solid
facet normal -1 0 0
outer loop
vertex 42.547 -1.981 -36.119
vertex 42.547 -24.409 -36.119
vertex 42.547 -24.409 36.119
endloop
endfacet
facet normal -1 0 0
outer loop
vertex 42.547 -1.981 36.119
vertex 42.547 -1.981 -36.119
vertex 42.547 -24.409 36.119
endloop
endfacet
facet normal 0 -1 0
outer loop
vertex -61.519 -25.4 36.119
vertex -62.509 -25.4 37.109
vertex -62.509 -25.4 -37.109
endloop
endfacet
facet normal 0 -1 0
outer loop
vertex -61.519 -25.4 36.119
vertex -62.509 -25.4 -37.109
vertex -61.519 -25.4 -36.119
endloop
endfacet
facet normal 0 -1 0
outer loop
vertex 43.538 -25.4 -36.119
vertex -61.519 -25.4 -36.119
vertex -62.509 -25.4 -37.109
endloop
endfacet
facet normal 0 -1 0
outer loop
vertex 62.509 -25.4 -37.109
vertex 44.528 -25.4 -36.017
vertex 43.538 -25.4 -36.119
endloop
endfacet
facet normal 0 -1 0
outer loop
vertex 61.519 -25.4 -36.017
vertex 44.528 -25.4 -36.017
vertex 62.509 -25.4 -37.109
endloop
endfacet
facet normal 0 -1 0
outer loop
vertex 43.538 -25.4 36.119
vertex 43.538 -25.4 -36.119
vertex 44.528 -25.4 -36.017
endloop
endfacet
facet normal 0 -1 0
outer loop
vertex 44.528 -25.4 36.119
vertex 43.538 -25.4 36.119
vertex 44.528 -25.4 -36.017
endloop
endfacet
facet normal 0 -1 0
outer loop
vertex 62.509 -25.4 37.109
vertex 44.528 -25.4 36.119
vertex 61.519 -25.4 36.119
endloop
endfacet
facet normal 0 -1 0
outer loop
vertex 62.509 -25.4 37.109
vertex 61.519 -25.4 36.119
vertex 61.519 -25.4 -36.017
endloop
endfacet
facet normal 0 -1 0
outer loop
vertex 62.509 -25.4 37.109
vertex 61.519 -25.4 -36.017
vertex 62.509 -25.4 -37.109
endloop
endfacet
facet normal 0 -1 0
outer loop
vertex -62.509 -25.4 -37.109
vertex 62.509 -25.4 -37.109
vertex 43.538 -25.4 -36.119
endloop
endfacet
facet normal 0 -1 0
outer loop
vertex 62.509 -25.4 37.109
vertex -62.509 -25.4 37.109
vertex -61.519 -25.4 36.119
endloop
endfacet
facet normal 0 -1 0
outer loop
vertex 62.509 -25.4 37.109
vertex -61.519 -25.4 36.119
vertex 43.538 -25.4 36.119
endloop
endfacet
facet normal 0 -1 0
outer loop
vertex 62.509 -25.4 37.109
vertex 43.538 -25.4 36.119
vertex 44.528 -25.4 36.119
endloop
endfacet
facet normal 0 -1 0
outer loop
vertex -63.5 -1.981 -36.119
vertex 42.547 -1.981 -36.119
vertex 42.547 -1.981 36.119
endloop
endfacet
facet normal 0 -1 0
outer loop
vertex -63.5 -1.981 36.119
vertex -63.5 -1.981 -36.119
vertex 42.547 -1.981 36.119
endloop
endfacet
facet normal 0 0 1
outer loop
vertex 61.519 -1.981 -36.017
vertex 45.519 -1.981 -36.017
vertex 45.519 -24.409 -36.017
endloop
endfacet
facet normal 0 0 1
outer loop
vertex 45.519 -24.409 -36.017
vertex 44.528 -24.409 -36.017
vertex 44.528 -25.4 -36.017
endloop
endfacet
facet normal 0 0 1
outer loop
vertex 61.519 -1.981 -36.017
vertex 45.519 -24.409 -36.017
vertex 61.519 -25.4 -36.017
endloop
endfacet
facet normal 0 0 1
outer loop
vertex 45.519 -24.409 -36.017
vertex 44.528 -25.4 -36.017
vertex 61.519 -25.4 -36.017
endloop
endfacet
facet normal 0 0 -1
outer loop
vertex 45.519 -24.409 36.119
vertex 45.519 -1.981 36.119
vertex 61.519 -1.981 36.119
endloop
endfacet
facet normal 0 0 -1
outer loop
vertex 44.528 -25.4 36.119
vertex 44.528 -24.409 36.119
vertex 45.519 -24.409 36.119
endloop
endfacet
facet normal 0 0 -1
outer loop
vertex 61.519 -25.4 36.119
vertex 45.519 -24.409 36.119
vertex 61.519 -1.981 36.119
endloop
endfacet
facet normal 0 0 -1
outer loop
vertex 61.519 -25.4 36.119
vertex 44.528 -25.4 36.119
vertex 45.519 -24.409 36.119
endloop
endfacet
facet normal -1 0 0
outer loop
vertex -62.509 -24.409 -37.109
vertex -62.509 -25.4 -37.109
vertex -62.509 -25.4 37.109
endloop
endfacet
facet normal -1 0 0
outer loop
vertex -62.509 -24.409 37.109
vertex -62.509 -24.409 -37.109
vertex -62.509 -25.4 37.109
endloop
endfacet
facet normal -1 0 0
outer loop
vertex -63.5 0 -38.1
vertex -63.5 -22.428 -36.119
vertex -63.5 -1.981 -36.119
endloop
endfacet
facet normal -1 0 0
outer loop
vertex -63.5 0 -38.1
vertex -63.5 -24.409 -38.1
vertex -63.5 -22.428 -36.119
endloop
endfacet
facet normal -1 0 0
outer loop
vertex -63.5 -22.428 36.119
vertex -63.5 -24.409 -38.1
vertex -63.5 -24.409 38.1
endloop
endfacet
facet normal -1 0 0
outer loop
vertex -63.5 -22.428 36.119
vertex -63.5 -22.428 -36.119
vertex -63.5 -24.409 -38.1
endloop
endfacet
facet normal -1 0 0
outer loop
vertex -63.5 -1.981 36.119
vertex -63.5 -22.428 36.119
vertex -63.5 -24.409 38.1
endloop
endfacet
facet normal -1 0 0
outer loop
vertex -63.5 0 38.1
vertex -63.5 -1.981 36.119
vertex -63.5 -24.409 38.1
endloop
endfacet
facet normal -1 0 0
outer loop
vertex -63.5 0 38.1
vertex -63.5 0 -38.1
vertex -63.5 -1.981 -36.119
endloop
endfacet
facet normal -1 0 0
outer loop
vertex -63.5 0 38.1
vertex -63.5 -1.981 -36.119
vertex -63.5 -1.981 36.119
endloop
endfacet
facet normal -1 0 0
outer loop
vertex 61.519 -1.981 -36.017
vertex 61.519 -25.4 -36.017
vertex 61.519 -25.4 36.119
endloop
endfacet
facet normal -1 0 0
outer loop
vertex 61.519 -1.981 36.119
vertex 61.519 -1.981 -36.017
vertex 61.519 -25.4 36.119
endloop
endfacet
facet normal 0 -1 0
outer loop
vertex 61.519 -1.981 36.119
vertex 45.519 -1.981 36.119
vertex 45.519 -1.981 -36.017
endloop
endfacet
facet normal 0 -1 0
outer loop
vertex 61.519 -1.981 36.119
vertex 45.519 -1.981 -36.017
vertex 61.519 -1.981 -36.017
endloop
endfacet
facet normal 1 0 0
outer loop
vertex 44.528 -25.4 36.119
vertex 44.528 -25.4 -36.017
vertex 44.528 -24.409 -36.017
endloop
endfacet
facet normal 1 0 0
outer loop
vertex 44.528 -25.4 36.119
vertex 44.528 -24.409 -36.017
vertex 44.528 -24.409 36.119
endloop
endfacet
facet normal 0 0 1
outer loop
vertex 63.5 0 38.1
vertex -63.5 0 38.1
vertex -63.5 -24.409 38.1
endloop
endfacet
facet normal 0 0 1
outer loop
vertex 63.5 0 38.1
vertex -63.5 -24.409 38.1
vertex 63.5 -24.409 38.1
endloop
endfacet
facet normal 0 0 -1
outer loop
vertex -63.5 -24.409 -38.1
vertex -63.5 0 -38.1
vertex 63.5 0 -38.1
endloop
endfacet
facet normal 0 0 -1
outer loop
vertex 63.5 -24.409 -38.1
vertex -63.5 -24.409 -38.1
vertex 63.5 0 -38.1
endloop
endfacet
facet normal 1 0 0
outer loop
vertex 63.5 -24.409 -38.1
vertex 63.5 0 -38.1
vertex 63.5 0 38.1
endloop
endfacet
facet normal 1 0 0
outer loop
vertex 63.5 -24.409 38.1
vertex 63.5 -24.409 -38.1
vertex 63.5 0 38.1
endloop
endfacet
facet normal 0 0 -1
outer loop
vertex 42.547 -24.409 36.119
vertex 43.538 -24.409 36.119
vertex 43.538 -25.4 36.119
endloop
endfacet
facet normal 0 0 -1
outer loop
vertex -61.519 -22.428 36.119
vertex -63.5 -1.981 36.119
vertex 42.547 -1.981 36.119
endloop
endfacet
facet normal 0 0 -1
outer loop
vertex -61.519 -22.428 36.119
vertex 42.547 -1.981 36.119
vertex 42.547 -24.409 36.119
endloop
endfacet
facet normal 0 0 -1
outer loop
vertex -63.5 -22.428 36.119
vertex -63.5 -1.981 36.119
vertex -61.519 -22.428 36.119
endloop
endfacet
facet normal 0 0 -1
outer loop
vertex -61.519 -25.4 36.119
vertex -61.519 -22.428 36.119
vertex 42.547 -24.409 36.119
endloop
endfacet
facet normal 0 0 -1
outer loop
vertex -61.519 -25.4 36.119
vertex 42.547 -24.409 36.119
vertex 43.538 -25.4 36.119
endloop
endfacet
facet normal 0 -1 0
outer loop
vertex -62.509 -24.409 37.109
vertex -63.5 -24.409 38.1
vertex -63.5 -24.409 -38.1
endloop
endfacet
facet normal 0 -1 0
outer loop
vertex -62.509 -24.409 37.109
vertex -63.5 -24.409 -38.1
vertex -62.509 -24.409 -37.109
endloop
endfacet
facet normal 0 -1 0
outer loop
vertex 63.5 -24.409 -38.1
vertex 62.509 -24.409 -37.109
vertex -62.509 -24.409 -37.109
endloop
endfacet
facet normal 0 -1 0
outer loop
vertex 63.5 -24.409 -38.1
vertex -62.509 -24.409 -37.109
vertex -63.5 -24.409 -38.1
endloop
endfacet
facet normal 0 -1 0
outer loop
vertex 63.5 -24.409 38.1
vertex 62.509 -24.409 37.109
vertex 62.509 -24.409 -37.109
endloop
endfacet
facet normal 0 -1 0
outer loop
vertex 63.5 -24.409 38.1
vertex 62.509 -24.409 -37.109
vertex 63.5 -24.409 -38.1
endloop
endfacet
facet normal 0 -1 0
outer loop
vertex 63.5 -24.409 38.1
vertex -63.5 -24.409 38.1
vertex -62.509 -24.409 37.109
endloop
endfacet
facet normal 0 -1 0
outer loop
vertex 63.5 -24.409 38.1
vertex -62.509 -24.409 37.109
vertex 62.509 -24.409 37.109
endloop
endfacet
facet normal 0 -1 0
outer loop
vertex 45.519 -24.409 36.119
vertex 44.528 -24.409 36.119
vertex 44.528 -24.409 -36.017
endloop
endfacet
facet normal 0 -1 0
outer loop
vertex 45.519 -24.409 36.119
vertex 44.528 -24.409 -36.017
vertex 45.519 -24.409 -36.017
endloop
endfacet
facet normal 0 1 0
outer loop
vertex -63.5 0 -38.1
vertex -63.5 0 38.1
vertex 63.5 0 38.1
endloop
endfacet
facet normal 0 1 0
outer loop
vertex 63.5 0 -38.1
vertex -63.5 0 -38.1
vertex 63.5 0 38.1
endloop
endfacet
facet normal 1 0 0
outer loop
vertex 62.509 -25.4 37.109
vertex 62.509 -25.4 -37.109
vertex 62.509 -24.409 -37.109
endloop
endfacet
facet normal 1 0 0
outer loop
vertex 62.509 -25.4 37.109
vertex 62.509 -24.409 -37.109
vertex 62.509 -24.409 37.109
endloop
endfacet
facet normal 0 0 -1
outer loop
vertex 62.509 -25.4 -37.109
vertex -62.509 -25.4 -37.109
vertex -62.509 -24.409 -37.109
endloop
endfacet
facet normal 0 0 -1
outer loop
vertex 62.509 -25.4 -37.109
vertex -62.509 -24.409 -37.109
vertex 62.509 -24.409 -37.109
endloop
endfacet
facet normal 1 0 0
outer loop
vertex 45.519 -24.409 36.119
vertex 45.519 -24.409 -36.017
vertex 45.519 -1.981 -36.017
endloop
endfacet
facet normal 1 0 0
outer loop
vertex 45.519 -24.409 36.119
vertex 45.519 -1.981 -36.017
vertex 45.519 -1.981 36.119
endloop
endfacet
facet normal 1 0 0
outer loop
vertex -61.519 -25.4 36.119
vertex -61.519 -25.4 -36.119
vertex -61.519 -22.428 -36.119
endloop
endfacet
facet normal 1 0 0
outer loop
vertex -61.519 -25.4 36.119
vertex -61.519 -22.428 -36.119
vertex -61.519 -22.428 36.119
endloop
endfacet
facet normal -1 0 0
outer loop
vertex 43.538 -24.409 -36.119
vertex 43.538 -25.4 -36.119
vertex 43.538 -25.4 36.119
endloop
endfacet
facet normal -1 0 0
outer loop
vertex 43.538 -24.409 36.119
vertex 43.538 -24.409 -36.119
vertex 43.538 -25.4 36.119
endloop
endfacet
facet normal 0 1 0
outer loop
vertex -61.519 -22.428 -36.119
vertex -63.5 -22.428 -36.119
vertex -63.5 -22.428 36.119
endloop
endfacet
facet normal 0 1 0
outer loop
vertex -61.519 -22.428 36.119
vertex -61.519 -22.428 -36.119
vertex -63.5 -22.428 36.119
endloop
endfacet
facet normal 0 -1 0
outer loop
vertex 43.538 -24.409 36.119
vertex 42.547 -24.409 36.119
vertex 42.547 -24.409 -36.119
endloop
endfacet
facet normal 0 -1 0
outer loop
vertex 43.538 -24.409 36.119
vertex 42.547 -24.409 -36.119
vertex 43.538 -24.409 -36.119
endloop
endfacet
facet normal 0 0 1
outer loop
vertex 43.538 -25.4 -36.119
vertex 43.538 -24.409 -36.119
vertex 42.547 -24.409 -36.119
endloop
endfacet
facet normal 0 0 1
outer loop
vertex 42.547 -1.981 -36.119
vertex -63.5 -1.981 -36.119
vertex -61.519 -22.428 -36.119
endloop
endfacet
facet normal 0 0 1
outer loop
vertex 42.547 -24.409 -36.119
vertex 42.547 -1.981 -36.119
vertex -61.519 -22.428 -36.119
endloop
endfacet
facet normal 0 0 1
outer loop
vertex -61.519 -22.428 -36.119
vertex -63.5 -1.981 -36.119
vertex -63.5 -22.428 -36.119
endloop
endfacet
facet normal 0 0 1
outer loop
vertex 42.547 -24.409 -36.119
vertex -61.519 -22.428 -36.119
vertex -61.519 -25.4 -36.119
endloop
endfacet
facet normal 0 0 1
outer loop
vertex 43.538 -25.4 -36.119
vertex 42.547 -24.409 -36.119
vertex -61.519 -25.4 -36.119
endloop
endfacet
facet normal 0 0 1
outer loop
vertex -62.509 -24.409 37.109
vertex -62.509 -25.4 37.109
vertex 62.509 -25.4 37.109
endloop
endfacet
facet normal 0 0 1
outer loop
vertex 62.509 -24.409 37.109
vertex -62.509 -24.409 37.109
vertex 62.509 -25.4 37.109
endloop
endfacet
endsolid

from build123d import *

# Parameters (mm, degrees)
F0_W      = 127
F0_H      = 76.2
F1_DEPTH  = 25.4
F2_W      = 15.9999934
F2_H      = 72.136
F3_DEPTH  = 23.4188
F4_W      = 0.9906
F4_H      = 72.136
F5_DEPTH  = 0.9906
F6_W      = 127
F6_H      = 0.9906
F7_DEPTH  = 0.9906
F8_W      = 0.9906
F8_H      = 75.2094
F9_DEPTH  = 0.9906
F10_W     = 0.9906
F10_H     = 75.2094
F11_DEPTH = 0.9906
F12_W     = 125.0188
F12_H     = 0.9906
F13_DEPTH = 0.9906
F14_W     = 104.0658066
F14_H     = 72.2376
F15_DEPTH = 23.4188
F16_W     = 0.9906
F16_H     = 72.2376
F17_DEPTH = 0.9906
F18_W     = 20.447
F18_H     = 72.2376
F19_DEPTH = 1.9812


with BuildPart() as f1:
    # F0 (on Front) → F1 (new body)
    with BuildSketch(Plane.XZ):
        Rectangle(F0_W, F0_H)
    extrude(amount=F1_DEPTH)

    # F2 (on face) → F3 (cut)
    with BuildSketch(Plane.XZ.offset(25.4)):
        with Locations((53.5188033, 0.0508)):
            Rectangle(F2_W, F2_H)
    extrude(amount=-F3_DEPTH, mode=Mode.SUBTRACT)

    # F4 (on face) → F5 (cut)
    with BuildSketch(Plane.XZ.offset(25.4)):
        with Locations((45.0235066, 0.0508)):
            Rectangle(F4_W, F4_H)
    extrude(amount=-F5_DEPTH, mode=Mode.SUBTRACT)

    # F6 (on face) → F7 (cut)
    with BuildSketch(Plane.XZ.offset(25.4)):
        with Locations((0, 37.6047)):
            Rectangle(F6_W, F6_H)
    extrude(amount=-F7_DEPTH, mode=Mode.SUBTRACT)

    # F8 (on face) → F9 (cut)
    with BuildSketch(Plane.XZ.offset(25.4)):
        with Locations((63.0047, -0.4953)):
            Rectangle(F8_W, F8_H)
    extrude(amount=-F9_DEPTH, mode=Mode.SUBTRACT)

    # F10 (on face) → F11 (cut)
    with BuildSketch(Plane.XZ.offset(25.4)):
        with Locations((-63.0047, -0.4953)):
            Rectangle(F10_W, F10_H)
    extrude(amount=-F11_DEPTH, mode=Mode.SUBTRACT)

    # F12 (on face) → F13 (cut)
    with BuildSketch(Plane.XZ.offset(25.4)):
        with Locations((0, -37.6047)):
            Rectangle(F12_W, F12_H)
    extrude(amount=-F13_DEPTH, mode=Mode.SUBTRACT)

    # F14 (on face) → F15 (cut)
    with BuildSketch(Plane.XZ.offset(25.4)):
        with Locations((-9.4858967, 0)):
            Rectangle(F14_W, F14_H)
    extrude(amount=-F15_DEPTH, mode=Mode.SUBTRACT)

    # F16 (on face) → F17 (cut)
    with BuildSketch(Plane.XZ.offset(25.4)):
        with Locations((43.0423066, 0)):
            Rectangle(F16_W, F16_H)
    extrude(amount=-F17_DEPTH, mode=Mode.SUBTRACT)

    # F18 (on face) → F19 (cut)
    with BuildSketch(Plane(origin=(-63.5, 0, 0), x_dir=(0, -1, 0), z_dir=(-1, 0, 0))):
        with Locations((12.2047, 0)):
            Rectangle(F18_W, F18_H)
    extrude(amount=-F19_DEPTH, mode=Mode.SUBTRACT)


solid = f1.part
